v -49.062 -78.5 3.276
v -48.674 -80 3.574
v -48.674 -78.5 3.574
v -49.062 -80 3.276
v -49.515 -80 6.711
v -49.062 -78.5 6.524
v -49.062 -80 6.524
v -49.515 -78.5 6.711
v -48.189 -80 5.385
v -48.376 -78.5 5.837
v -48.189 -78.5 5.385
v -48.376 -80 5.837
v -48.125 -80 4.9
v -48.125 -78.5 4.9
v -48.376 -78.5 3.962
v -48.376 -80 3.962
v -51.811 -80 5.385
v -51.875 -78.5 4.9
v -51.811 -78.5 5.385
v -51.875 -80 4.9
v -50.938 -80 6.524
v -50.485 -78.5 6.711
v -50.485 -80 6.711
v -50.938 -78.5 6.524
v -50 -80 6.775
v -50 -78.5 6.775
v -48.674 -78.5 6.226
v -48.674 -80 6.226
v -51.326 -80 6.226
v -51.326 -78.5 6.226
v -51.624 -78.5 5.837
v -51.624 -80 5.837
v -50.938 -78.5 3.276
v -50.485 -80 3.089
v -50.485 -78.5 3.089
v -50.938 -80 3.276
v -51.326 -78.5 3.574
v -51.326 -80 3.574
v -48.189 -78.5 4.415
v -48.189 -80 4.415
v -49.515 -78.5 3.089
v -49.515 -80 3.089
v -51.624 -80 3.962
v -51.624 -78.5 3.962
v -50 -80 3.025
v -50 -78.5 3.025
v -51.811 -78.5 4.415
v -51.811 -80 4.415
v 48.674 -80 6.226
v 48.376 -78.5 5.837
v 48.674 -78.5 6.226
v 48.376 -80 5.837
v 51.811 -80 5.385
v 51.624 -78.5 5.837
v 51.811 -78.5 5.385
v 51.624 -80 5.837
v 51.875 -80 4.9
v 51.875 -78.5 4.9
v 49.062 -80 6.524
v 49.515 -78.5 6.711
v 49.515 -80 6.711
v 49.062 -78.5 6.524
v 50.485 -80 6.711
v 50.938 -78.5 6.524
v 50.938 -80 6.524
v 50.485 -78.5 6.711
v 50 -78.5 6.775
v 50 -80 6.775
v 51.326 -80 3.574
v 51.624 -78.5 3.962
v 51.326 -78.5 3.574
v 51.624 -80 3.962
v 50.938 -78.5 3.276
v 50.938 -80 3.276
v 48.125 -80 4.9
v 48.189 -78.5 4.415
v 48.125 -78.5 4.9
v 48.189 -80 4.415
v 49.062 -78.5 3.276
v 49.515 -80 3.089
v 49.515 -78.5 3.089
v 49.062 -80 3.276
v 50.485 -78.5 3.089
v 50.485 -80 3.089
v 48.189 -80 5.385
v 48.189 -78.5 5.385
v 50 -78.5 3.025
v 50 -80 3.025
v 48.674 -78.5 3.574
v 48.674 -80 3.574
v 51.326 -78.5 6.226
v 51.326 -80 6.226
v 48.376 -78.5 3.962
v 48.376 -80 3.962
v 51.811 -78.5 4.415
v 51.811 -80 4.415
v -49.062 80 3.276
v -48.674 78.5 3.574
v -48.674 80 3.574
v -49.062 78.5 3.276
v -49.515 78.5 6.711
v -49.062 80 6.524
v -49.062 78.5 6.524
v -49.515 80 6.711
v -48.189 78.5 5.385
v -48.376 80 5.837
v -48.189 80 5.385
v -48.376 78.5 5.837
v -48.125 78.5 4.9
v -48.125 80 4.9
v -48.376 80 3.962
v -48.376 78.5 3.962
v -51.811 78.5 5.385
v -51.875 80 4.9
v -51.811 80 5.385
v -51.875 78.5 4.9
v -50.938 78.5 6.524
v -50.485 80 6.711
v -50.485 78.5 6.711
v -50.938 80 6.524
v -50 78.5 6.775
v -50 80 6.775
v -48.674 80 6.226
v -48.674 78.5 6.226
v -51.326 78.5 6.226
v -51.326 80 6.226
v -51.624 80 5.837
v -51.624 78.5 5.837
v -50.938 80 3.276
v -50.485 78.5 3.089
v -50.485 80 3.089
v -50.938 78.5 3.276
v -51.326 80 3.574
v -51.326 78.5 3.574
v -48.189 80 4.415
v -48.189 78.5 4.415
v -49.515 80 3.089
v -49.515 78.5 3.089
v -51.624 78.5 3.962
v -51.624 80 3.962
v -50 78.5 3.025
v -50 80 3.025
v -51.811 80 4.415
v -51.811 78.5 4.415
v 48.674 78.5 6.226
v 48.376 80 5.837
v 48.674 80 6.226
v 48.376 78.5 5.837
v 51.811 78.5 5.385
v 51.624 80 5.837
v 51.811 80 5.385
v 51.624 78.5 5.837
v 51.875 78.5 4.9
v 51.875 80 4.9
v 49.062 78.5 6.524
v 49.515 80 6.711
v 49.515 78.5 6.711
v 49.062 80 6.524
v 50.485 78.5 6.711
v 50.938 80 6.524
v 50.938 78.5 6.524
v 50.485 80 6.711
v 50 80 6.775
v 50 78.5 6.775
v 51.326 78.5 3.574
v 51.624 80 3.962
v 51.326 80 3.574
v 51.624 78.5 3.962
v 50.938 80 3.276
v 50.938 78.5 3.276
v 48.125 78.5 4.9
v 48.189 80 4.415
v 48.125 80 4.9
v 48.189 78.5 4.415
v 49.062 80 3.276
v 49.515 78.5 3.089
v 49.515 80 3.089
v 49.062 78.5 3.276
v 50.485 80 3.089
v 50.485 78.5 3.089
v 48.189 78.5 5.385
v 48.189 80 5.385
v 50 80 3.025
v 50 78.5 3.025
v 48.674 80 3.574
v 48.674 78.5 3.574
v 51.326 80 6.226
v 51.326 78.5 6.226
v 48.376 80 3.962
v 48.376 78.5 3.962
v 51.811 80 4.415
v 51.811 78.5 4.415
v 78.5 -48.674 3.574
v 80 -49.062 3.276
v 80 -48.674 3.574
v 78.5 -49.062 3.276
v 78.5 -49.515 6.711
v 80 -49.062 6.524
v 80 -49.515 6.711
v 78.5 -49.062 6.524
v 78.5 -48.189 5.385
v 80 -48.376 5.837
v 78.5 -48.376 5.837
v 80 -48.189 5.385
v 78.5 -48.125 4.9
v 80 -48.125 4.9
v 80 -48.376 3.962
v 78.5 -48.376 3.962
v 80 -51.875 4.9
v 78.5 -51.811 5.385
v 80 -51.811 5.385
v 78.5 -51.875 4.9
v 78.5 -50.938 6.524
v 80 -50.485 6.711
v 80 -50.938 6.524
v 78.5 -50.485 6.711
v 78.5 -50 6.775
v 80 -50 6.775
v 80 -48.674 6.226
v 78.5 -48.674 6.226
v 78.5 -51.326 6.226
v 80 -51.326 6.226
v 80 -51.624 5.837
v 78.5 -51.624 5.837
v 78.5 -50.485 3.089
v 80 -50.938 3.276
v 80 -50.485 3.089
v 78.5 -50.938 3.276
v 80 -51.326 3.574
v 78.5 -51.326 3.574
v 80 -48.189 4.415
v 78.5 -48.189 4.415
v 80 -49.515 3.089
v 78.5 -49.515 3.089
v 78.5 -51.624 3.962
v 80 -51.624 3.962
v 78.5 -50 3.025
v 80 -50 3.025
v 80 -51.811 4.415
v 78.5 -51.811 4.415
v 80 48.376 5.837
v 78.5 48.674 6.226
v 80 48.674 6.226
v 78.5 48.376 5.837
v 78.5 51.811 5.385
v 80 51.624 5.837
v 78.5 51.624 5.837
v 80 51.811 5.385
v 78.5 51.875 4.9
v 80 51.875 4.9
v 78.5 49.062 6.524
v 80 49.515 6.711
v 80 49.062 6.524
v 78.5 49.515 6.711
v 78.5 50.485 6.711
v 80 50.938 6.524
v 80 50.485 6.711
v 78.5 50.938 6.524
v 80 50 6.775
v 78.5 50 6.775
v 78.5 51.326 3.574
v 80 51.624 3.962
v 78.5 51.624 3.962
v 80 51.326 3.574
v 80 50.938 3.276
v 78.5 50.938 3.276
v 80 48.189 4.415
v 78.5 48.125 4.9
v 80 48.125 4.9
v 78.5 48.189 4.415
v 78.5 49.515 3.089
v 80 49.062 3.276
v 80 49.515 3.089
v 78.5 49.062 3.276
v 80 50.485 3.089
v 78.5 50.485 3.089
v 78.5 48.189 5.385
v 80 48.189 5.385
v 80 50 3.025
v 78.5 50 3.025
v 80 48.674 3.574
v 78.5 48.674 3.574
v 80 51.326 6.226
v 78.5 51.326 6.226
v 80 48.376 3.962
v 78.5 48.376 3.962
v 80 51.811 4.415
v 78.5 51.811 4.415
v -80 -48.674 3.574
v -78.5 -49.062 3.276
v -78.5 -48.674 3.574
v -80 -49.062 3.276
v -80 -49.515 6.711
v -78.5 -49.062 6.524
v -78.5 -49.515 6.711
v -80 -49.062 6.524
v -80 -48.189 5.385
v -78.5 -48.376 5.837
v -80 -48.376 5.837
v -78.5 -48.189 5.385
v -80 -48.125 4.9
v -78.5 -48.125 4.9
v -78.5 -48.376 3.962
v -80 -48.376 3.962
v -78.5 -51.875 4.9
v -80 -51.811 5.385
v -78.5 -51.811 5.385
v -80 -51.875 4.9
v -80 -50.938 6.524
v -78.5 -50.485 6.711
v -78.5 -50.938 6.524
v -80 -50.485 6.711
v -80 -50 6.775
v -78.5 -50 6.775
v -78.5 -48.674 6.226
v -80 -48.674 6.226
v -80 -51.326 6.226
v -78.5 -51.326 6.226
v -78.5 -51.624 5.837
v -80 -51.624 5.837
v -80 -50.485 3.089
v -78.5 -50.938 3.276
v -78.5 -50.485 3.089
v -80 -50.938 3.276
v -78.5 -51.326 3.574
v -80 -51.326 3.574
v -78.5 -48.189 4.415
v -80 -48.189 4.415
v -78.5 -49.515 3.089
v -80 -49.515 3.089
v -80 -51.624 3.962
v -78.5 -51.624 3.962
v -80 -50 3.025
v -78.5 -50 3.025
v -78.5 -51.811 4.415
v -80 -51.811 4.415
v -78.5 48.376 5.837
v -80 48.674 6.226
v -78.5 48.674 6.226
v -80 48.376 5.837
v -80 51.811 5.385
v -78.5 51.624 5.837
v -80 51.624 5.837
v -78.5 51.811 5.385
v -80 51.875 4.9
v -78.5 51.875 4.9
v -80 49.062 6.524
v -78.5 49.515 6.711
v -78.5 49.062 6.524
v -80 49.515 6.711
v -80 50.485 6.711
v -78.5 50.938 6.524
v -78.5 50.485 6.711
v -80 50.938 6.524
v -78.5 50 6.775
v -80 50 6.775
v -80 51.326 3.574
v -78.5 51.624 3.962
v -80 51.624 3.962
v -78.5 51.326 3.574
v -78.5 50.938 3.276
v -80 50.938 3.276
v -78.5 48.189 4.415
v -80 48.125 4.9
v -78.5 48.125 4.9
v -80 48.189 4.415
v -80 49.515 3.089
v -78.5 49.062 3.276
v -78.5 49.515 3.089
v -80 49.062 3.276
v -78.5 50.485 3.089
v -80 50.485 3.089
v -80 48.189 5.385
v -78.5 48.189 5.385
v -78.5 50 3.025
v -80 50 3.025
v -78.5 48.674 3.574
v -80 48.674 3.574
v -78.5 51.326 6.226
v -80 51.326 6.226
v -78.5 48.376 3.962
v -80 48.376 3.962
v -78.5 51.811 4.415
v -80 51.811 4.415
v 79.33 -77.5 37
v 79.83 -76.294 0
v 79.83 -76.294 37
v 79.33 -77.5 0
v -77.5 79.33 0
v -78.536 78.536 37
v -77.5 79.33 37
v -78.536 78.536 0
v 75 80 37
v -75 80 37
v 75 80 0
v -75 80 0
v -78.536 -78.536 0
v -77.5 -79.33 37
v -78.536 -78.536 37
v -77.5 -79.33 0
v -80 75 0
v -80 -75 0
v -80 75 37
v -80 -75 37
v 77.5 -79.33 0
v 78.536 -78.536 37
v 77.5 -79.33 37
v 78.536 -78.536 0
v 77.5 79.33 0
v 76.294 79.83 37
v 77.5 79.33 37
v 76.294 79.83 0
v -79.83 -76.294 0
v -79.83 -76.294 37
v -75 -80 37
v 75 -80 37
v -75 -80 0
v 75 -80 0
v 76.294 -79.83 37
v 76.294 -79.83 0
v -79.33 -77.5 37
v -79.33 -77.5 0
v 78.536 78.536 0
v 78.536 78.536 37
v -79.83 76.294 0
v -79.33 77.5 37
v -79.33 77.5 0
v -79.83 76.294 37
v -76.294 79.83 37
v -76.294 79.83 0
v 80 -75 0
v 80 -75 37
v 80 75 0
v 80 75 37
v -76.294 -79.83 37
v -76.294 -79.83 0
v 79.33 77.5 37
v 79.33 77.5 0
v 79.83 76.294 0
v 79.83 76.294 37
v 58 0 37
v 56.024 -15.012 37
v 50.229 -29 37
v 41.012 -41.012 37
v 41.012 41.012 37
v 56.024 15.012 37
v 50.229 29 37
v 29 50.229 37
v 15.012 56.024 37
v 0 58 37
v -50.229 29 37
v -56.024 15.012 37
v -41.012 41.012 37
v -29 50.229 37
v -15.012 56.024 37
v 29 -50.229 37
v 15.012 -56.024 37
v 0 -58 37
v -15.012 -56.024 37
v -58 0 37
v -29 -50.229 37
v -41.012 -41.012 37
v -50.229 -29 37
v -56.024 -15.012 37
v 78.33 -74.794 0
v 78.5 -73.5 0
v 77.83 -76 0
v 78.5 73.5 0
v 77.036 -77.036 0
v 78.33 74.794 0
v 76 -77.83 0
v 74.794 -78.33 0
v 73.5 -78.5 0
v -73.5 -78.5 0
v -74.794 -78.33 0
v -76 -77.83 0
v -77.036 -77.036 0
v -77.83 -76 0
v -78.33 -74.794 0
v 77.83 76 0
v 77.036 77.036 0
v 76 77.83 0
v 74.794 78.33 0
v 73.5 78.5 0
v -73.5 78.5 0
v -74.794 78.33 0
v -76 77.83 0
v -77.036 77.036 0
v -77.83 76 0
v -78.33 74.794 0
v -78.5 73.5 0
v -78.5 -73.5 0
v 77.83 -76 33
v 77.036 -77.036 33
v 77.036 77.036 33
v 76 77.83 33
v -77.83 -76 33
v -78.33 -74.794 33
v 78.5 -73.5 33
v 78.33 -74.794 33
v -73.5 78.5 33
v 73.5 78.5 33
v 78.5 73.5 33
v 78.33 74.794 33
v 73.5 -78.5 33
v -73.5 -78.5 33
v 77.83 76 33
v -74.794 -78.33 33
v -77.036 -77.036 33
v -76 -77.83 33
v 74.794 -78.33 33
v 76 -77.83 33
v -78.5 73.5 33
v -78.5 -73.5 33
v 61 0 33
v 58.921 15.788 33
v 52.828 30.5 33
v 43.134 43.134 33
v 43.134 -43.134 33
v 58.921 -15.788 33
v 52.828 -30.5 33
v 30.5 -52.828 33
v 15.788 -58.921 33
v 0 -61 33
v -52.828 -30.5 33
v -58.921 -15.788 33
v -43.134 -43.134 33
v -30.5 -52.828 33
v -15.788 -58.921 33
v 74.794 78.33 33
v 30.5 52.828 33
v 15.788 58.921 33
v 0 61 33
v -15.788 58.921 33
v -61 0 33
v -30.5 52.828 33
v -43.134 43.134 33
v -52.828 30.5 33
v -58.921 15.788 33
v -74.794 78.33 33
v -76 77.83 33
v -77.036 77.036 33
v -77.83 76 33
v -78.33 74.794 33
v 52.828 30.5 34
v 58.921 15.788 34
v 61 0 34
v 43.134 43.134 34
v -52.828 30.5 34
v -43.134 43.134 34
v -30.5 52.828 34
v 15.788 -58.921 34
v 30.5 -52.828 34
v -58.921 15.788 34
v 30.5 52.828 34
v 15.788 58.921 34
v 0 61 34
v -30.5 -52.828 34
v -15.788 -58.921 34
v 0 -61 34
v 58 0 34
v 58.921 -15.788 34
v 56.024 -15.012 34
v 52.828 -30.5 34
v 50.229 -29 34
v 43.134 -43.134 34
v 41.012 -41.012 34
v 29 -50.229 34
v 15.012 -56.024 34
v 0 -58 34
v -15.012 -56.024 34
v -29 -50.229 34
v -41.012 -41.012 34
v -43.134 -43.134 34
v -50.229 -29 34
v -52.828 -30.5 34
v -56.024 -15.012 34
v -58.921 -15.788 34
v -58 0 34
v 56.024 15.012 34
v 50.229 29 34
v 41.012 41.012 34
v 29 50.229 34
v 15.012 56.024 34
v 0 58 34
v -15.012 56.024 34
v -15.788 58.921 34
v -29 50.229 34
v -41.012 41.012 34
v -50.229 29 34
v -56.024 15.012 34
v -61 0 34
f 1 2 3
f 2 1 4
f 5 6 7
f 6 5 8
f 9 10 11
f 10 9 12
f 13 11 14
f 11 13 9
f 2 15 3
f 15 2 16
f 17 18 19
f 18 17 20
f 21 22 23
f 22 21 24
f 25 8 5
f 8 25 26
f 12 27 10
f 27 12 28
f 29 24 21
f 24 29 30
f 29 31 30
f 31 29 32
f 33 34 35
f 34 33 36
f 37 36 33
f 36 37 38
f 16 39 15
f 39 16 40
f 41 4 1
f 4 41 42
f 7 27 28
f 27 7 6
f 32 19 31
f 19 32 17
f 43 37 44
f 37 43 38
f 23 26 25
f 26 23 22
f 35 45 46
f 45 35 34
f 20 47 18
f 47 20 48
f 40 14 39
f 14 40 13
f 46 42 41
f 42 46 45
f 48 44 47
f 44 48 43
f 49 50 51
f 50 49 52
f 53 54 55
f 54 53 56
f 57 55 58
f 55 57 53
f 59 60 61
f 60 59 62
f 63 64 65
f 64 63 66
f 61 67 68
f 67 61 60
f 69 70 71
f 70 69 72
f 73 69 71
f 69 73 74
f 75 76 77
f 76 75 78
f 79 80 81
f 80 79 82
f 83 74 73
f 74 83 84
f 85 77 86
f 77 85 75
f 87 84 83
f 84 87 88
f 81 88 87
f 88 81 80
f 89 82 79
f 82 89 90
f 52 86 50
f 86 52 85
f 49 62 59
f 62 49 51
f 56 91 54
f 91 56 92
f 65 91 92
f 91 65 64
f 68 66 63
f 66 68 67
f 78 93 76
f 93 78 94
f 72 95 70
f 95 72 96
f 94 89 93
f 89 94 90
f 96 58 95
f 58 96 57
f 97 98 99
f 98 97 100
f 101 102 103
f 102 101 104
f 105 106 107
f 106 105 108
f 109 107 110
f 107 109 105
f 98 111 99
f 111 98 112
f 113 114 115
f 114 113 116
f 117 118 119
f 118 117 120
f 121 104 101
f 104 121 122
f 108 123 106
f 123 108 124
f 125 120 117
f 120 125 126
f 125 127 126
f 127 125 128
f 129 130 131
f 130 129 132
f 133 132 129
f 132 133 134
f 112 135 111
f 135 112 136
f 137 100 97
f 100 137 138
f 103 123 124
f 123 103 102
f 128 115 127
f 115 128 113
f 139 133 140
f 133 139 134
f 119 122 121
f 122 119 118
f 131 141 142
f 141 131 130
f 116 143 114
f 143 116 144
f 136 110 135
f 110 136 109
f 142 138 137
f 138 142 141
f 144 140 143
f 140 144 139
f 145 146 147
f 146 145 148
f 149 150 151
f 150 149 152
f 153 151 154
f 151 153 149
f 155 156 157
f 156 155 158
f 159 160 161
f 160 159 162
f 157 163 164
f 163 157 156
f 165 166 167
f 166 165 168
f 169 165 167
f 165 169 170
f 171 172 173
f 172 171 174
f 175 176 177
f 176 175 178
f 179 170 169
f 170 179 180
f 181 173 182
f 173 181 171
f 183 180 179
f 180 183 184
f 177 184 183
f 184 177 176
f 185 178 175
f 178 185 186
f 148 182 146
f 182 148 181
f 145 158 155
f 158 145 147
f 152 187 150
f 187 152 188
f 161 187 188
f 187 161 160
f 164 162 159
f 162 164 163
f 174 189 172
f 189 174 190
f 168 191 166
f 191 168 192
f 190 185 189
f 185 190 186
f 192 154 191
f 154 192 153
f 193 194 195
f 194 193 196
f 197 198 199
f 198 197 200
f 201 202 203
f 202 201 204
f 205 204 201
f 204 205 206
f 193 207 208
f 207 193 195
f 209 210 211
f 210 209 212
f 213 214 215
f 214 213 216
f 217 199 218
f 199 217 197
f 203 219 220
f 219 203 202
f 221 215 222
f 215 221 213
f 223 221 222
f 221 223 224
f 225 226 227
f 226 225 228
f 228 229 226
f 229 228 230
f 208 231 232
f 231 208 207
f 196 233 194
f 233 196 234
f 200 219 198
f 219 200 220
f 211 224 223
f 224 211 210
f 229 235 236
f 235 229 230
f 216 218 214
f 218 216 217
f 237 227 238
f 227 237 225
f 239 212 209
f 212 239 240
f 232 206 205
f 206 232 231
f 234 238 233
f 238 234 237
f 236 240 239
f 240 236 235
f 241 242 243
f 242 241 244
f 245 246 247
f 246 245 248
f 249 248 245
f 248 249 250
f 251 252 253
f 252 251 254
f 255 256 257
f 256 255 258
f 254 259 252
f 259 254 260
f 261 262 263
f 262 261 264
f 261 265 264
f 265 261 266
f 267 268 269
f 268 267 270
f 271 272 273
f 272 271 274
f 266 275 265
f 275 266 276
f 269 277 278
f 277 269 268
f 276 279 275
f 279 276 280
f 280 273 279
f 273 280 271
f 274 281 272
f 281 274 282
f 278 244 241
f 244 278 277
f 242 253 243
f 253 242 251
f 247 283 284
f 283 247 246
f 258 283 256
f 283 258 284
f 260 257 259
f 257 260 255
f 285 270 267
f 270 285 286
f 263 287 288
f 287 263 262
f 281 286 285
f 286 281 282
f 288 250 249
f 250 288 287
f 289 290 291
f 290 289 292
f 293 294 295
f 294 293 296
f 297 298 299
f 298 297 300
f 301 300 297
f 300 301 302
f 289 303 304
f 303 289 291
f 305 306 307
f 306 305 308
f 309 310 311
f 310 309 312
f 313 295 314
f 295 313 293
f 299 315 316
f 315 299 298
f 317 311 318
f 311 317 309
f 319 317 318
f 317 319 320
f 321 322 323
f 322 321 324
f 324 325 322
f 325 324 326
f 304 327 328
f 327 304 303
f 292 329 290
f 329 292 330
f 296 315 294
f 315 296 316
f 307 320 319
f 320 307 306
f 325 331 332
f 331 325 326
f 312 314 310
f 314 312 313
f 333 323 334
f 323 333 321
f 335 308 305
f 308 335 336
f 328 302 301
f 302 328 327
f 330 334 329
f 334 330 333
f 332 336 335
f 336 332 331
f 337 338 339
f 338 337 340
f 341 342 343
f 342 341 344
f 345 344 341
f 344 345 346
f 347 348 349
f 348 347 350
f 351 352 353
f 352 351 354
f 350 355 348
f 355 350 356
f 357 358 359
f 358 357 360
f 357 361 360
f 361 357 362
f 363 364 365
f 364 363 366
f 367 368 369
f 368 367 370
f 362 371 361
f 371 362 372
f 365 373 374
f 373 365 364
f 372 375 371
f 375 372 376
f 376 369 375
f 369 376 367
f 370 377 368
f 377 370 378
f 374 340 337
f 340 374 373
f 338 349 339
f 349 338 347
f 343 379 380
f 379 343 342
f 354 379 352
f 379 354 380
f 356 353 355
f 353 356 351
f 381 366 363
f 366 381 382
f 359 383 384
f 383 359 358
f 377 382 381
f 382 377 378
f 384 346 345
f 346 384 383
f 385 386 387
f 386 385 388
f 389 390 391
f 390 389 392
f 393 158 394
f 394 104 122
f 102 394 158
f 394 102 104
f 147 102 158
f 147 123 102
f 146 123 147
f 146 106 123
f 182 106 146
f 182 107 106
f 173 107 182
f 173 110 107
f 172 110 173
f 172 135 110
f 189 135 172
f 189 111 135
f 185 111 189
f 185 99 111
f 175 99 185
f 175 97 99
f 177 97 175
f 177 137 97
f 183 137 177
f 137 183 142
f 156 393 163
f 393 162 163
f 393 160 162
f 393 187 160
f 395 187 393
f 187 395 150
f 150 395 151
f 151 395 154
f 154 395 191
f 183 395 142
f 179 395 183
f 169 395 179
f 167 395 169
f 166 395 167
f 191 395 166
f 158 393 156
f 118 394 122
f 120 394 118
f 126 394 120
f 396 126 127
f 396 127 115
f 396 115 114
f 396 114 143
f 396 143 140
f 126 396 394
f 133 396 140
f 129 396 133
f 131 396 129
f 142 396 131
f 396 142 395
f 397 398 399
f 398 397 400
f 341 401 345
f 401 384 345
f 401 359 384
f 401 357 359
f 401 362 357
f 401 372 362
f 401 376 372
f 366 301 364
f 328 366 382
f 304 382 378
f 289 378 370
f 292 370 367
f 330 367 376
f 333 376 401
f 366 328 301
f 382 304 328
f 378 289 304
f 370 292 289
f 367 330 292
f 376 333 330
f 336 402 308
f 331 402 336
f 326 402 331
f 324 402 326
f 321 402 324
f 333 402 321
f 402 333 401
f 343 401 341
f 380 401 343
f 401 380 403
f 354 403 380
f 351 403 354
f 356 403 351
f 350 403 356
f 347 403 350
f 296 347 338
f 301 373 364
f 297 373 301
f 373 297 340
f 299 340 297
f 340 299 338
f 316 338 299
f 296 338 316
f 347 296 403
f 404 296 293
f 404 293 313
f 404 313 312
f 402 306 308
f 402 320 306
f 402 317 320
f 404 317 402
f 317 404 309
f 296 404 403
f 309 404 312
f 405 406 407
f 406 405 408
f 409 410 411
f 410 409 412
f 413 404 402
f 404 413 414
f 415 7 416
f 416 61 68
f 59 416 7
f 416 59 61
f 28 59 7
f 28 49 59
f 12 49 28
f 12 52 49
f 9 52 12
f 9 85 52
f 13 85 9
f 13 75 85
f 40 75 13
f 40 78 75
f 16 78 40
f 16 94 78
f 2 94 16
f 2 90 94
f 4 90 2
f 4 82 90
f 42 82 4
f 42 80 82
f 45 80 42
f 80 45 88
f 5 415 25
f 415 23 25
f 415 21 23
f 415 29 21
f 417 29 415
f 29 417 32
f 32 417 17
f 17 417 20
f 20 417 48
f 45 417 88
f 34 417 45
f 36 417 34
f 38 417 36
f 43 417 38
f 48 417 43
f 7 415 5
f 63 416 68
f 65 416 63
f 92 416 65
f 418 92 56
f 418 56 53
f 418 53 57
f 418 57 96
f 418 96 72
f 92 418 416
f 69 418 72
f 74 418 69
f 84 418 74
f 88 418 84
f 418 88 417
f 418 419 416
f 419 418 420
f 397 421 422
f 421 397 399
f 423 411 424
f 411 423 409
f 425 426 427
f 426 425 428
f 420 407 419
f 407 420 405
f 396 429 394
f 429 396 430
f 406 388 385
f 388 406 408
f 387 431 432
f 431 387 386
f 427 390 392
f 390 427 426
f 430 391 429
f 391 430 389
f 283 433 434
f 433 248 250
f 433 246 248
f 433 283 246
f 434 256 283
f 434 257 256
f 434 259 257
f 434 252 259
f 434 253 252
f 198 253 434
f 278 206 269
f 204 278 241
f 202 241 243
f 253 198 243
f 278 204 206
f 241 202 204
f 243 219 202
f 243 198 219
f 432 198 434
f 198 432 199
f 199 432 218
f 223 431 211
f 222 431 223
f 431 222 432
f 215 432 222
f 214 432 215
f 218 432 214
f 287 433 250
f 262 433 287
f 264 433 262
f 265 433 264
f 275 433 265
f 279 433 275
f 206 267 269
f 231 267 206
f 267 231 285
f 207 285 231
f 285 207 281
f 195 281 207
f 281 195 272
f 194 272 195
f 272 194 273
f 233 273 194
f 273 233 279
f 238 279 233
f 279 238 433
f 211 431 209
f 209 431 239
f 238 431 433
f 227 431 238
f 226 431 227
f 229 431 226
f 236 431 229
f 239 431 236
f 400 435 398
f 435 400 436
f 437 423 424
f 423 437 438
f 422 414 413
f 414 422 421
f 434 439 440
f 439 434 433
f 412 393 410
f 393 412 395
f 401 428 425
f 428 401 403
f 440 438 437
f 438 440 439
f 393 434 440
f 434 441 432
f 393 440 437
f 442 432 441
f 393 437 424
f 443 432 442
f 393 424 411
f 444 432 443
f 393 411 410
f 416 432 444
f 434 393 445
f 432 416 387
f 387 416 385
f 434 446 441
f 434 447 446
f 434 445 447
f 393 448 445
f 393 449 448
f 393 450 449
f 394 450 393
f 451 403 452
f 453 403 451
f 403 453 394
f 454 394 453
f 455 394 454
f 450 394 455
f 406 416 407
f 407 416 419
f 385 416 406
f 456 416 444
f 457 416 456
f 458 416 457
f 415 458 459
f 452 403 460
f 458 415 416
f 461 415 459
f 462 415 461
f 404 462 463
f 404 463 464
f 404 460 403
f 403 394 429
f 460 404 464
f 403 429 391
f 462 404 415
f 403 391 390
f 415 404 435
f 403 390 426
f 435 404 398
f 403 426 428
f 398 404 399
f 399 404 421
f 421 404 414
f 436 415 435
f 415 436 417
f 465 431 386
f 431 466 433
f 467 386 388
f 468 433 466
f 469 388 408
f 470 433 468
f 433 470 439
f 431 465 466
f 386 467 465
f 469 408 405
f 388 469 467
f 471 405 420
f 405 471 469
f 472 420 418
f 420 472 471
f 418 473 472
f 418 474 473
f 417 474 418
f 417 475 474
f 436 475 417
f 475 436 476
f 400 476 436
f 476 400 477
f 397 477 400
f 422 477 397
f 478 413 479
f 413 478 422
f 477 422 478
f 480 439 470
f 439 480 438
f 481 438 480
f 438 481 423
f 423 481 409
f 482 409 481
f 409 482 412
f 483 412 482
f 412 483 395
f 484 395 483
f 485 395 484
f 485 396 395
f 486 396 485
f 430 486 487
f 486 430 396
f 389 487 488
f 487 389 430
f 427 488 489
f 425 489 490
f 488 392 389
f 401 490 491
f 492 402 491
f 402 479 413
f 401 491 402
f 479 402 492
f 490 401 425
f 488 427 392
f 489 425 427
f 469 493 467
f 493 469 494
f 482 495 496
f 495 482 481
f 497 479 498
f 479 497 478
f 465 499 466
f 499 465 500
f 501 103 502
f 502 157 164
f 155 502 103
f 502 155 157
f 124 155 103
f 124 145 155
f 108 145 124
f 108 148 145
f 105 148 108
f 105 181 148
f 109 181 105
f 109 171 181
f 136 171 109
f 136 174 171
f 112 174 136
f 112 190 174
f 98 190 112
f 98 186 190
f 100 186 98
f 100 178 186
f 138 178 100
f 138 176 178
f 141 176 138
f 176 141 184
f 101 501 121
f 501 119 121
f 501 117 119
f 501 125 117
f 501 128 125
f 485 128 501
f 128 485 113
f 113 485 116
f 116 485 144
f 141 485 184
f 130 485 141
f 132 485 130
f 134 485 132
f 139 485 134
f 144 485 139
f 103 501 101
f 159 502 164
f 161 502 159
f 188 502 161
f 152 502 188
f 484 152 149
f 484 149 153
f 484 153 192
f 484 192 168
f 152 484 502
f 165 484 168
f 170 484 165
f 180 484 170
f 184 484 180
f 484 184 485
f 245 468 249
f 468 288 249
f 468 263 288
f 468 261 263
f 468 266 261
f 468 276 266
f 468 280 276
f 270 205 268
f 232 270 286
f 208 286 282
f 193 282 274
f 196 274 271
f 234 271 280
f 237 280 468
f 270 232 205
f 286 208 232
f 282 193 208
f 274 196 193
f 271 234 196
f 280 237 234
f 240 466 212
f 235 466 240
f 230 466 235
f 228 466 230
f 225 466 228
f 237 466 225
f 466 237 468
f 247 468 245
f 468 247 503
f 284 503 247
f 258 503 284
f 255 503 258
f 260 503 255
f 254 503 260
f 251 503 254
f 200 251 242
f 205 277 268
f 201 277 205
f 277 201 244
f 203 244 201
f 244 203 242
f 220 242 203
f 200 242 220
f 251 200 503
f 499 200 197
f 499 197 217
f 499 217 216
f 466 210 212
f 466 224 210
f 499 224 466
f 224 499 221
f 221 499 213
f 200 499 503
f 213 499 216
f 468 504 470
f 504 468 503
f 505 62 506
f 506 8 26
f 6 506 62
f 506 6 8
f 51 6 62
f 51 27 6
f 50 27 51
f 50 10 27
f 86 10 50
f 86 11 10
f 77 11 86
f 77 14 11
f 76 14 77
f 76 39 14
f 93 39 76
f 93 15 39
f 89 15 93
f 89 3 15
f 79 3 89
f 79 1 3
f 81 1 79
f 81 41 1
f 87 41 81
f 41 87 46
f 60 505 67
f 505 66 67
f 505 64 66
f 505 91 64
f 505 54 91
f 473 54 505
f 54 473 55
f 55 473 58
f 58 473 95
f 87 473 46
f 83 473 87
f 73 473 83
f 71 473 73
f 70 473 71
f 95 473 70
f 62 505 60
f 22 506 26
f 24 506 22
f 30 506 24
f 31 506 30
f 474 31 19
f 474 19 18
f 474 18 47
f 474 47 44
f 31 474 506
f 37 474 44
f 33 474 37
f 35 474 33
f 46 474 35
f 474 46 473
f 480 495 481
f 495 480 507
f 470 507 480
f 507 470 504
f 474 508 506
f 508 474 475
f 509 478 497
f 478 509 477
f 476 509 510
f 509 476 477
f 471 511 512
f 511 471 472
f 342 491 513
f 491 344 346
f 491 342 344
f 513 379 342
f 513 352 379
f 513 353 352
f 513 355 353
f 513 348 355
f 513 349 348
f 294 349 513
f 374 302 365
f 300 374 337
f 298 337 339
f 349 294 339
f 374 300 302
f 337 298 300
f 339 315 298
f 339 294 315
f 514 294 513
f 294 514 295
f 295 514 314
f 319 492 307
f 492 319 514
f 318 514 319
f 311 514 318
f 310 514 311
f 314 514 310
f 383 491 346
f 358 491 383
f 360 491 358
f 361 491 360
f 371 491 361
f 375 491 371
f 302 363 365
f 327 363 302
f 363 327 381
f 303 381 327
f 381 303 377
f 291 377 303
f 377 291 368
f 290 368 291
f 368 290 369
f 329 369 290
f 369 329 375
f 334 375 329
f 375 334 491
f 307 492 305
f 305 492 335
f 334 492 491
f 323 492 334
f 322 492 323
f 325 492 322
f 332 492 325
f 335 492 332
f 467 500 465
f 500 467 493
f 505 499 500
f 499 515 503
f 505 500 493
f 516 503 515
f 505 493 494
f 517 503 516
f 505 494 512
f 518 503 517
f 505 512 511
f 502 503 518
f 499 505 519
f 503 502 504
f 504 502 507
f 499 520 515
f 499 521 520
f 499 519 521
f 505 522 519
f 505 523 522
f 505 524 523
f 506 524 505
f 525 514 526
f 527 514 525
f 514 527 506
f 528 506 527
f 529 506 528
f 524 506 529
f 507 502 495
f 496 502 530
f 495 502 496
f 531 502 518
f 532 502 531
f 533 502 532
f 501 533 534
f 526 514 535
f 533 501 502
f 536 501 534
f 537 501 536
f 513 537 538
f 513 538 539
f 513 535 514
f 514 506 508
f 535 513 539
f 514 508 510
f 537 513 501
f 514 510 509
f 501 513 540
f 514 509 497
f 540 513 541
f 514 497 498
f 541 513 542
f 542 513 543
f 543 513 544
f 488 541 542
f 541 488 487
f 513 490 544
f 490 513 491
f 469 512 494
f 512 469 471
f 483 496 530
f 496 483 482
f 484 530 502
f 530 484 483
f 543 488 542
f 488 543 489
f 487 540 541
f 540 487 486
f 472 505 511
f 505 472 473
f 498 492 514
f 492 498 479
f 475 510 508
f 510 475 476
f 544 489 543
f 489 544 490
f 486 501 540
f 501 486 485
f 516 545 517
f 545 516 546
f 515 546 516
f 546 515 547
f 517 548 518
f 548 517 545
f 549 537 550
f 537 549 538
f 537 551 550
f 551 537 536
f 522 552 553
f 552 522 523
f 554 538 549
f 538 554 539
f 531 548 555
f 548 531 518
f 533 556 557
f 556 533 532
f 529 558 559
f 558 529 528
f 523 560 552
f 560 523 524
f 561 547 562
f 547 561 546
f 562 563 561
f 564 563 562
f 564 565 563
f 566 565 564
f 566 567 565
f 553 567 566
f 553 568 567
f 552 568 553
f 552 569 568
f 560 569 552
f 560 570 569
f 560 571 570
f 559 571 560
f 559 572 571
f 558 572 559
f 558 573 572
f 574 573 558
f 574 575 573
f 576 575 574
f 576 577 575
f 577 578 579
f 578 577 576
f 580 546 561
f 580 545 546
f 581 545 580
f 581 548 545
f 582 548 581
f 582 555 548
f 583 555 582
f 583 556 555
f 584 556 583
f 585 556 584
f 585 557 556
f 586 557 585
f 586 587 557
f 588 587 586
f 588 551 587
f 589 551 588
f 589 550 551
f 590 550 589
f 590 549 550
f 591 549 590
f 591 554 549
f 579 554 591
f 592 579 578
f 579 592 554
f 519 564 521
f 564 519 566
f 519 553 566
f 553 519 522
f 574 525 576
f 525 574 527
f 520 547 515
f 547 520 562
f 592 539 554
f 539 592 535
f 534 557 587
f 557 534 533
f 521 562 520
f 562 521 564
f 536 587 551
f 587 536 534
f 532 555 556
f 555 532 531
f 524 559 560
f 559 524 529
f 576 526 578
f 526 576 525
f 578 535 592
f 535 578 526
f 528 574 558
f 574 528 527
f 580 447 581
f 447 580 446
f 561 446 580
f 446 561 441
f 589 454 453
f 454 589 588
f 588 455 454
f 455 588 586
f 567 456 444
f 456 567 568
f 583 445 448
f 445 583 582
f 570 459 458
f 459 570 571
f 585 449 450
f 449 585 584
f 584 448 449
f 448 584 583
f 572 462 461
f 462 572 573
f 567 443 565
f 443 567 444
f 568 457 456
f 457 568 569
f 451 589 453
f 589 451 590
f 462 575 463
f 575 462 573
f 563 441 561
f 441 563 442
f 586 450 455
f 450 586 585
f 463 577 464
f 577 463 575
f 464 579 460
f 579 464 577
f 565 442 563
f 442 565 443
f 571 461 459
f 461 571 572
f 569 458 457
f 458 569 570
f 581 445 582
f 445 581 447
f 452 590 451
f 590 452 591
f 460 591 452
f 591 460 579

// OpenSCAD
// file: ../OpenSCAD_Modules/cube_vround.scad
module cube_vround(
	size=[10,10,10],
	round_corners=[true,true,true,true],
	rounding=3,
	center_xy=false,
	center_z=false,
	attach=0,
	wall_attach=0,
	quality=2, //integer from 1 to infinity
)
{
	assert(len(size)==3);
	assert(len(round_corners)==4);
	assert(rounding>0);
	assert(rounding<=size[0]/2);
	assert(rounding<=size[1]/2);
	assert(quality>0);
	assert(attach>=0);
	assert(wall_attach>=0);
	height=size[2]+attach;
	cyl_r=rounding+wall_attach;
	cyl_mvx=size[0]/2-rounding;
	cyl_mvy=size[1]/2-rounding;
	cube_szx=size[0]/2;
	cube_szy=size[1]/2;
	cube_mvx=cube_szx/2+wall_attach;
	cube_mvy=cube_szy/2+wall_attach;
	translate([center_xy?0:cube_szx,center_xy?0:cube_szy,center_z?-attach/2:(size[2]-attach)/2])
		hull()
		{
			if(round_corners[0])
				translate([cyl_mvx,cyl_mvy])
					cylinder(r=cyl_r,h=height,$fn=12*quality,center=true);
			else
				translate([cube_mvx,cube_mvy])
					cube([cube_szx,cube_szy,height],center=true);
			if(round_corners[1])
				translate([cyl_mvx,-cyl_mvy])
					cylinder(r=cyl_r,h=height,$fn=12*quality,center=true);
			else
				translate([cube_mvx,-cube_mvy])
					cube([cube_szx,cube_szy,height],center=true);
			if(round_corners[2])
				translate([-cyl_mvx,-cyl_mvy])
					cylinder(r=cyl_r,h=height,$fn=12*quality,center=true);
			else
				translate([-cube_mvx,-cube_mvy])
					cube([cube_szx,cube_szy,height],center=true);
			if(round_corners[3])
				translate([-cyl_mvx,cyl_mvy])
					cylinder(r=cyl_r,h=height,$fn=12*quality,center=true);
			else
				translate([-cube_mvx,cube_mvy])
					cube([cube_szx,cube_szy,height],center=true);
		};
}

//example
cube_vround(round_corners=[true,false,true,false],
size=[10,20,6],
attach=0.1,
wall_attach=0.1,
rounding=3,
center_xy=true,center_z=false);
// main file
use <../OpenSCAD_Modules/cube_vround.scad>

module CaseCover1
(
	ext_size=[160,160,37],
	int_size=[157,157,33,122,34,116],
	extClipHoleHeight=5-0.1,
	extClipHoleDiam=3.75,
	extClipDiff=[100,100],
	quality=2,
)
{
	cutClr=1;
	difference()
	{
		cube_vround(size=ext_size,center_xy=true,rounding=5,quality=quality);
		translate([0,0,-cutClr])
			cube_vround(size=[int_size[0],int_size[1],int_size[2]+cutClr],center_xy=true,rounding=5,quality=quality);
		translate([0,0,-cutClr])
			cylinder(d=int_size[3],h=int_size[4]+cutClr,$fn=quality*12);
		translate([0,0,-cutClr])
			cylinder(d=int_size[5],h=ext_size[2]+2*cutClr,$fn=quality*12);

		for(d=[0:1])
		rotate(a=90,v=[0,0,d])
		for (j=[-1:2:1])
		translate([0,j*ext_size[1-d]/2,0])
		for (i=[-1:2:1])
		translate([i*extClipDiff[d]/2,0,extClipHoleHeight])
		rotate(a=90,v=[1,0,0])
		cylinder(d=extClipHoleDiam,h=(d>0?ext_size[0]-int_size[0]:ext_size[1]-int_size[1])+2*cutClr,center=true,$fn=quality*12);
	}
}

CaseCover1();
